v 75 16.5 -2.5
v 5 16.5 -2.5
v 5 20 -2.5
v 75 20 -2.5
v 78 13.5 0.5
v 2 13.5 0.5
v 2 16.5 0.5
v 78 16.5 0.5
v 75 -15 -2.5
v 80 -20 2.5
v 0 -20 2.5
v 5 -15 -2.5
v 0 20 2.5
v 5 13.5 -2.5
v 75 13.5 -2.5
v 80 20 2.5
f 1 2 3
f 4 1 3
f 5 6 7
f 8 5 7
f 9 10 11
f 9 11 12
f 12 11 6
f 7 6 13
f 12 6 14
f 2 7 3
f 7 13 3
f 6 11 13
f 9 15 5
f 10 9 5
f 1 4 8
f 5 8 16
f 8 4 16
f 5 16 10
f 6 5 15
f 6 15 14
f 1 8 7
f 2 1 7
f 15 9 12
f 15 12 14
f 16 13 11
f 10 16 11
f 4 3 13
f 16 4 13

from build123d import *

# Parameters (mm, degrees)
BOSS_EXTRUDE1_DEPTH     = 80
CUT_EXTRUDE1_DEPTH      = 80
SKETCH3_W               = 3
SKETCH3_H               = 3
CUT_EXTRUDE2_DEPTH      = 81
CUT_EXTRUDE2_DEPTH_BACK = 1


with BuildPart() as part:
    # Sketch1 → Boss-Extrude1 (new body)
    with BuildSketch(Plane(origin=(0, 0, 0), x_dir=(0, 0, -1), z_dir=(1, 0, 0))):
        Polygon((-2.5, -20), (2.5, -15), (2.5, 20), (-2.5, 20), align=None)
    extrude(amount=BOSS_EXTRUDE1_DEPTH)

    # Sketch2 → Cut-Extrude1 (cut)
    with BuildSketch(Plane(origin=(0, 20, 0), x_dir=(1, 0, 0), z_dir=(0, 1, 0))):
        Polygon((80, 2.5), (75, 2.5), (80, -2.5), align=None)
        Polygon((0, -2.5), (5, 2.5), (0, 2.5), align=None)
    extrude(amount=-CUT_EXTRUDE1_DEPTH, mode=Mode.SUBTRACT)

    # Sketch3 → Cut-Extrude2 (cut, two sides)
    with BuildSketch(Plane(origin=(0, 0, 0), x_dir=(0, 0, -1), z_dir=(1, 0, 0))) as cut_extrude2_sk:
        with Locations((1, 15)):
            Rectangle(SKETCH3_W, SKETCH3_H)
    extrude(amount=CUT_EXTRUDE2_DEPTH, mode=Mode.SUBTRACT)
    extrude(cut_extrude2_sk.sketch, amount=-CUT_EXTRUDE2_DEPTH_BACK, mode=Mode.SUBTRACT)


solid = part.part
